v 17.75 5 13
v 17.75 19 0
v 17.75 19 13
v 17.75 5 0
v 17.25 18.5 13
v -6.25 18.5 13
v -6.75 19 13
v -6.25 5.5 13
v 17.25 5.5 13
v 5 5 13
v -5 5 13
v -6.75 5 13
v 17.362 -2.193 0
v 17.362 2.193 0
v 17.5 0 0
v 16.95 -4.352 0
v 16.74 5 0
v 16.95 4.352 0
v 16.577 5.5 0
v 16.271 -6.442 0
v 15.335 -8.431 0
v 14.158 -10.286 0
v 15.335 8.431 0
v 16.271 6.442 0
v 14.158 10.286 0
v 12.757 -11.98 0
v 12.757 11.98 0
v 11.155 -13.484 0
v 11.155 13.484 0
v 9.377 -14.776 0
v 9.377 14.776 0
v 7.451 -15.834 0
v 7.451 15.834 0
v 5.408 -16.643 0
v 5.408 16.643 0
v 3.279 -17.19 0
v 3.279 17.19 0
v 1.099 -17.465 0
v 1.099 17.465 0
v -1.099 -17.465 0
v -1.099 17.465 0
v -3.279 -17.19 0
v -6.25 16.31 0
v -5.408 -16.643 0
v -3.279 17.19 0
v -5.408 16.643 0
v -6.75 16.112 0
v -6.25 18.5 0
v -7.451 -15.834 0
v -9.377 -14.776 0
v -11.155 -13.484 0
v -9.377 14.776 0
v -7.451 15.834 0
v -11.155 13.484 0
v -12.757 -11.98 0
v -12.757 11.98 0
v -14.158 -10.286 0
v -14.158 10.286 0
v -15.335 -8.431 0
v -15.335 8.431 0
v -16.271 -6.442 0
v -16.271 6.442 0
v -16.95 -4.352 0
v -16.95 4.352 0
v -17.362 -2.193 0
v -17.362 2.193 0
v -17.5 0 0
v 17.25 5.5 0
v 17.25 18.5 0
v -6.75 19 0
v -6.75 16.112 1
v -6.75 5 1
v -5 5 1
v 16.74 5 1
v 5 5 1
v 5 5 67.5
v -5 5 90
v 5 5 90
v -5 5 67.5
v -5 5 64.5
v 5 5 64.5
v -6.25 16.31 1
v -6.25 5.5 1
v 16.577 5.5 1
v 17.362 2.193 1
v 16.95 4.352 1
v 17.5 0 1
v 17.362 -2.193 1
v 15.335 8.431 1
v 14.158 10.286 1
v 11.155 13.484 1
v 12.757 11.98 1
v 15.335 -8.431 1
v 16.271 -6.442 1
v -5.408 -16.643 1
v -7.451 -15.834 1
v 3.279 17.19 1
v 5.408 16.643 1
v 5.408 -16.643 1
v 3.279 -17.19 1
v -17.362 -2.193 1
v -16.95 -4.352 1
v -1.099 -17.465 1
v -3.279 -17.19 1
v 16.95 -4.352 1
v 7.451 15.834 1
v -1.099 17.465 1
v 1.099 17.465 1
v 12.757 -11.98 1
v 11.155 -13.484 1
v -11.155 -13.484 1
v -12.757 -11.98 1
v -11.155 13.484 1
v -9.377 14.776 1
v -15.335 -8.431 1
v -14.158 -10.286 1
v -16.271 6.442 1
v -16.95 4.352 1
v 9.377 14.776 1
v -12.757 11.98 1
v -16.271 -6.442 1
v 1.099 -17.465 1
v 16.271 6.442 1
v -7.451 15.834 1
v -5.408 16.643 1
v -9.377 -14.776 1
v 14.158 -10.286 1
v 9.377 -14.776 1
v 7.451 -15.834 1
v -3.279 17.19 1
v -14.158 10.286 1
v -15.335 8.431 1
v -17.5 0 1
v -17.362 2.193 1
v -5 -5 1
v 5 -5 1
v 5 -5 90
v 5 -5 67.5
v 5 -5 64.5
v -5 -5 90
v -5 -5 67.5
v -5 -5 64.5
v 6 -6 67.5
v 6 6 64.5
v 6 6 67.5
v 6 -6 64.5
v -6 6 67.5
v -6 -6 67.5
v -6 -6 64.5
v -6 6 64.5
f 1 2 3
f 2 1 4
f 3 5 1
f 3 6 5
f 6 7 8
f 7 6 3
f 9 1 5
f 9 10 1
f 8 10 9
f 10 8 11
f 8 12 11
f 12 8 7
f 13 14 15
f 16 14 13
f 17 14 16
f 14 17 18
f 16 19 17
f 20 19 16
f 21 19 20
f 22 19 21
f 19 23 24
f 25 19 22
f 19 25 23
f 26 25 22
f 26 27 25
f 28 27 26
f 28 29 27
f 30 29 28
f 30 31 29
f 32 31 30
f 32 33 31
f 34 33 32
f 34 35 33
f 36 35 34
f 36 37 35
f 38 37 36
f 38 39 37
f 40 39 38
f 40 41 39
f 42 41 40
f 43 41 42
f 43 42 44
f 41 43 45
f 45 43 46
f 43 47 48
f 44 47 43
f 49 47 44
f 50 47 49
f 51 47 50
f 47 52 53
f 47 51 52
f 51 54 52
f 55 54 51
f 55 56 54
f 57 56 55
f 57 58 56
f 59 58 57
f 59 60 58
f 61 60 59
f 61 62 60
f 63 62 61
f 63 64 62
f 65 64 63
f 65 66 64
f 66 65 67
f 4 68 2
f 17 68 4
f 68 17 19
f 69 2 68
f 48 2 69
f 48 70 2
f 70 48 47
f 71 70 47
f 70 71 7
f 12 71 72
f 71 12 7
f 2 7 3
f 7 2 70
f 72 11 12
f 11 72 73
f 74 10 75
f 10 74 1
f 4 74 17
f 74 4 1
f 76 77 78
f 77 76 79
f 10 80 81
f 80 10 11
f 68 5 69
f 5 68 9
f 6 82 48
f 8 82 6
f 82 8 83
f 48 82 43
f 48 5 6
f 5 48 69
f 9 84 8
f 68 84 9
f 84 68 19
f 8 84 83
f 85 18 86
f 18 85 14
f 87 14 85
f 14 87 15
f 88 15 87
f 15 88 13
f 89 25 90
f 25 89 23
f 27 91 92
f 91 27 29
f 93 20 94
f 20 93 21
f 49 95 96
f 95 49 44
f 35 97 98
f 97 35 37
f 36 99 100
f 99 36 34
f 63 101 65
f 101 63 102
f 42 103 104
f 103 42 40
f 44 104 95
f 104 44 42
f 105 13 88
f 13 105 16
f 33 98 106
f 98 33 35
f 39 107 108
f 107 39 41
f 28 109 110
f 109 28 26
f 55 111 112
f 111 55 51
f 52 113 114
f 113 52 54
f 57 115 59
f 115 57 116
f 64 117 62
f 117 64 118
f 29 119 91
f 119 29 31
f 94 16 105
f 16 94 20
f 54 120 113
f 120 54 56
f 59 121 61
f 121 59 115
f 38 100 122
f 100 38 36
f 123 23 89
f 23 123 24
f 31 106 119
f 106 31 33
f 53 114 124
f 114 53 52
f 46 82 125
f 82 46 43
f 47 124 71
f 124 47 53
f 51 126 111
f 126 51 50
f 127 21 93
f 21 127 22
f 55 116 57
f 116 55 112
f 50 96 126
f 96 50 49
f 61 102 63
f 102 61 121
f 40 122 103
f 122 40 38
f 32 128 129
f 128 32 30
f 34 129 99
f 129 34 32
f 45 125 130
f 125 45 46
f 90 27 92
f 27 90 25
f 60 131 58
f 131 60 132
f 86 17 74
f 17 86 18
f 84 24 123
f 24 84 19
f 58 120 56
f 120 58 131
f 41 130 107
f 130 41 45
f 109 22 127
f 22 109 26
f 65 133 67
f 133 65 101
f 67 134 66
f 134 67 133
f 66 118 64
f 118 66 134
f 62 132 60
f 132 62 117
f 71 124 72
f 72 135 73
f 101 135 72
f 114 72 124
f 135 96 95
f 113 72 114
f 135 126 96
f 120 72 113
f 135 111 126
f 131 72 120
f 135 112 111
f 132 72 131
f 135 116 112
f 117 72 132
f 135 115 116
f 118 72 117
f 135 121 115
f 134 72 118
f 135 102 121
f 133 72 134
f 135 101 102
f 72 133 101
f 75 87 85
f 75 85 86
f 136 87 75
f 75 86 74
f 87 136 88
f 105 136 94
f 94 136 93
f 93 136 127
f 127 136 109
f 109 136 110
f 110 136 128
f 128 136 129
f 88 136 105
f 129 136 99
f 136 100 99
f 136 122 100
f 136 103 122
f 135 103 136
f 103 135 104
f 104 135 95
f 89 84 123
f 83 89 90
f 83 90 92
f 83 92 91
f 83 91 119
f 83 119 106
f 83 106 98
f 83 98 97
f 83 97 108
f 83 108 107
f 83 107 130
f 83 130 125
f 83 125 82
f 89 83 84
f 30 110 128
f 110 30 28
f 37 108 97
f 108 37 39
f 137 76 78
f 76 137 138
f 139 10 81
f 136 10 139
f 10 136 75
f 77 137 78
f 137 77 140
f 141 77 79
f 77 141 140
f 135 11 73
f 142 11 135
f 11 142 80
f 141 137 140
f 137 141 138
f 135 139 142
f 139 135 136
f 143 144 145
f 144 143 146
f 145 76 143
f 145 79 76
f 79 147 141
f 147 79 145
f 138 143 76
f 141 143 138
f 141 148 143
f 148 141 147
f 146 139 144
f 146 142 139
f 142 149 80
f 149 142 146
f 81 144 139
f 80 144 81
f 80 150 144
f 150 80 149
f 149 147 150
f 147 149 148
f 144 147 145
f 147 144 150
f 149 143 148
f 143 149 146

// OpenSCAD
// file: servo_holder.scad
servo_x = 23;
servo_y = 12.5;
servo_z = 13;

servo_x_offset = servo_x/2 - 6;

servo_x_clearance = 0.5;
servo_y_clearance = 0.5;

wall_thickness = 1;



translate([0,0,servo_z/2])
difference(){
    cube([
        servo_x+servo_x_clearance+wall_thickness, 
        servo_y+servo_y_clearance+wall_thickness,
        servo_z], center=true);
    cube([
        servo_x+servo_x_clearance, 
        servo_y+servo_y_clearance,
        servo_z+1], center=true);
}
// main file
$fn=50;

cylinder(d=35);

translate([0,0,90/2])
cube([10,10,90], center=true);

translate([0,0,66])
cube([12,12,3], center=true);

servo_x = 23;
servo_x_offset = servo_x/2 - 6;



translate([servo_x_offset,12,0]){
    include<servo_holder.scad>
}
